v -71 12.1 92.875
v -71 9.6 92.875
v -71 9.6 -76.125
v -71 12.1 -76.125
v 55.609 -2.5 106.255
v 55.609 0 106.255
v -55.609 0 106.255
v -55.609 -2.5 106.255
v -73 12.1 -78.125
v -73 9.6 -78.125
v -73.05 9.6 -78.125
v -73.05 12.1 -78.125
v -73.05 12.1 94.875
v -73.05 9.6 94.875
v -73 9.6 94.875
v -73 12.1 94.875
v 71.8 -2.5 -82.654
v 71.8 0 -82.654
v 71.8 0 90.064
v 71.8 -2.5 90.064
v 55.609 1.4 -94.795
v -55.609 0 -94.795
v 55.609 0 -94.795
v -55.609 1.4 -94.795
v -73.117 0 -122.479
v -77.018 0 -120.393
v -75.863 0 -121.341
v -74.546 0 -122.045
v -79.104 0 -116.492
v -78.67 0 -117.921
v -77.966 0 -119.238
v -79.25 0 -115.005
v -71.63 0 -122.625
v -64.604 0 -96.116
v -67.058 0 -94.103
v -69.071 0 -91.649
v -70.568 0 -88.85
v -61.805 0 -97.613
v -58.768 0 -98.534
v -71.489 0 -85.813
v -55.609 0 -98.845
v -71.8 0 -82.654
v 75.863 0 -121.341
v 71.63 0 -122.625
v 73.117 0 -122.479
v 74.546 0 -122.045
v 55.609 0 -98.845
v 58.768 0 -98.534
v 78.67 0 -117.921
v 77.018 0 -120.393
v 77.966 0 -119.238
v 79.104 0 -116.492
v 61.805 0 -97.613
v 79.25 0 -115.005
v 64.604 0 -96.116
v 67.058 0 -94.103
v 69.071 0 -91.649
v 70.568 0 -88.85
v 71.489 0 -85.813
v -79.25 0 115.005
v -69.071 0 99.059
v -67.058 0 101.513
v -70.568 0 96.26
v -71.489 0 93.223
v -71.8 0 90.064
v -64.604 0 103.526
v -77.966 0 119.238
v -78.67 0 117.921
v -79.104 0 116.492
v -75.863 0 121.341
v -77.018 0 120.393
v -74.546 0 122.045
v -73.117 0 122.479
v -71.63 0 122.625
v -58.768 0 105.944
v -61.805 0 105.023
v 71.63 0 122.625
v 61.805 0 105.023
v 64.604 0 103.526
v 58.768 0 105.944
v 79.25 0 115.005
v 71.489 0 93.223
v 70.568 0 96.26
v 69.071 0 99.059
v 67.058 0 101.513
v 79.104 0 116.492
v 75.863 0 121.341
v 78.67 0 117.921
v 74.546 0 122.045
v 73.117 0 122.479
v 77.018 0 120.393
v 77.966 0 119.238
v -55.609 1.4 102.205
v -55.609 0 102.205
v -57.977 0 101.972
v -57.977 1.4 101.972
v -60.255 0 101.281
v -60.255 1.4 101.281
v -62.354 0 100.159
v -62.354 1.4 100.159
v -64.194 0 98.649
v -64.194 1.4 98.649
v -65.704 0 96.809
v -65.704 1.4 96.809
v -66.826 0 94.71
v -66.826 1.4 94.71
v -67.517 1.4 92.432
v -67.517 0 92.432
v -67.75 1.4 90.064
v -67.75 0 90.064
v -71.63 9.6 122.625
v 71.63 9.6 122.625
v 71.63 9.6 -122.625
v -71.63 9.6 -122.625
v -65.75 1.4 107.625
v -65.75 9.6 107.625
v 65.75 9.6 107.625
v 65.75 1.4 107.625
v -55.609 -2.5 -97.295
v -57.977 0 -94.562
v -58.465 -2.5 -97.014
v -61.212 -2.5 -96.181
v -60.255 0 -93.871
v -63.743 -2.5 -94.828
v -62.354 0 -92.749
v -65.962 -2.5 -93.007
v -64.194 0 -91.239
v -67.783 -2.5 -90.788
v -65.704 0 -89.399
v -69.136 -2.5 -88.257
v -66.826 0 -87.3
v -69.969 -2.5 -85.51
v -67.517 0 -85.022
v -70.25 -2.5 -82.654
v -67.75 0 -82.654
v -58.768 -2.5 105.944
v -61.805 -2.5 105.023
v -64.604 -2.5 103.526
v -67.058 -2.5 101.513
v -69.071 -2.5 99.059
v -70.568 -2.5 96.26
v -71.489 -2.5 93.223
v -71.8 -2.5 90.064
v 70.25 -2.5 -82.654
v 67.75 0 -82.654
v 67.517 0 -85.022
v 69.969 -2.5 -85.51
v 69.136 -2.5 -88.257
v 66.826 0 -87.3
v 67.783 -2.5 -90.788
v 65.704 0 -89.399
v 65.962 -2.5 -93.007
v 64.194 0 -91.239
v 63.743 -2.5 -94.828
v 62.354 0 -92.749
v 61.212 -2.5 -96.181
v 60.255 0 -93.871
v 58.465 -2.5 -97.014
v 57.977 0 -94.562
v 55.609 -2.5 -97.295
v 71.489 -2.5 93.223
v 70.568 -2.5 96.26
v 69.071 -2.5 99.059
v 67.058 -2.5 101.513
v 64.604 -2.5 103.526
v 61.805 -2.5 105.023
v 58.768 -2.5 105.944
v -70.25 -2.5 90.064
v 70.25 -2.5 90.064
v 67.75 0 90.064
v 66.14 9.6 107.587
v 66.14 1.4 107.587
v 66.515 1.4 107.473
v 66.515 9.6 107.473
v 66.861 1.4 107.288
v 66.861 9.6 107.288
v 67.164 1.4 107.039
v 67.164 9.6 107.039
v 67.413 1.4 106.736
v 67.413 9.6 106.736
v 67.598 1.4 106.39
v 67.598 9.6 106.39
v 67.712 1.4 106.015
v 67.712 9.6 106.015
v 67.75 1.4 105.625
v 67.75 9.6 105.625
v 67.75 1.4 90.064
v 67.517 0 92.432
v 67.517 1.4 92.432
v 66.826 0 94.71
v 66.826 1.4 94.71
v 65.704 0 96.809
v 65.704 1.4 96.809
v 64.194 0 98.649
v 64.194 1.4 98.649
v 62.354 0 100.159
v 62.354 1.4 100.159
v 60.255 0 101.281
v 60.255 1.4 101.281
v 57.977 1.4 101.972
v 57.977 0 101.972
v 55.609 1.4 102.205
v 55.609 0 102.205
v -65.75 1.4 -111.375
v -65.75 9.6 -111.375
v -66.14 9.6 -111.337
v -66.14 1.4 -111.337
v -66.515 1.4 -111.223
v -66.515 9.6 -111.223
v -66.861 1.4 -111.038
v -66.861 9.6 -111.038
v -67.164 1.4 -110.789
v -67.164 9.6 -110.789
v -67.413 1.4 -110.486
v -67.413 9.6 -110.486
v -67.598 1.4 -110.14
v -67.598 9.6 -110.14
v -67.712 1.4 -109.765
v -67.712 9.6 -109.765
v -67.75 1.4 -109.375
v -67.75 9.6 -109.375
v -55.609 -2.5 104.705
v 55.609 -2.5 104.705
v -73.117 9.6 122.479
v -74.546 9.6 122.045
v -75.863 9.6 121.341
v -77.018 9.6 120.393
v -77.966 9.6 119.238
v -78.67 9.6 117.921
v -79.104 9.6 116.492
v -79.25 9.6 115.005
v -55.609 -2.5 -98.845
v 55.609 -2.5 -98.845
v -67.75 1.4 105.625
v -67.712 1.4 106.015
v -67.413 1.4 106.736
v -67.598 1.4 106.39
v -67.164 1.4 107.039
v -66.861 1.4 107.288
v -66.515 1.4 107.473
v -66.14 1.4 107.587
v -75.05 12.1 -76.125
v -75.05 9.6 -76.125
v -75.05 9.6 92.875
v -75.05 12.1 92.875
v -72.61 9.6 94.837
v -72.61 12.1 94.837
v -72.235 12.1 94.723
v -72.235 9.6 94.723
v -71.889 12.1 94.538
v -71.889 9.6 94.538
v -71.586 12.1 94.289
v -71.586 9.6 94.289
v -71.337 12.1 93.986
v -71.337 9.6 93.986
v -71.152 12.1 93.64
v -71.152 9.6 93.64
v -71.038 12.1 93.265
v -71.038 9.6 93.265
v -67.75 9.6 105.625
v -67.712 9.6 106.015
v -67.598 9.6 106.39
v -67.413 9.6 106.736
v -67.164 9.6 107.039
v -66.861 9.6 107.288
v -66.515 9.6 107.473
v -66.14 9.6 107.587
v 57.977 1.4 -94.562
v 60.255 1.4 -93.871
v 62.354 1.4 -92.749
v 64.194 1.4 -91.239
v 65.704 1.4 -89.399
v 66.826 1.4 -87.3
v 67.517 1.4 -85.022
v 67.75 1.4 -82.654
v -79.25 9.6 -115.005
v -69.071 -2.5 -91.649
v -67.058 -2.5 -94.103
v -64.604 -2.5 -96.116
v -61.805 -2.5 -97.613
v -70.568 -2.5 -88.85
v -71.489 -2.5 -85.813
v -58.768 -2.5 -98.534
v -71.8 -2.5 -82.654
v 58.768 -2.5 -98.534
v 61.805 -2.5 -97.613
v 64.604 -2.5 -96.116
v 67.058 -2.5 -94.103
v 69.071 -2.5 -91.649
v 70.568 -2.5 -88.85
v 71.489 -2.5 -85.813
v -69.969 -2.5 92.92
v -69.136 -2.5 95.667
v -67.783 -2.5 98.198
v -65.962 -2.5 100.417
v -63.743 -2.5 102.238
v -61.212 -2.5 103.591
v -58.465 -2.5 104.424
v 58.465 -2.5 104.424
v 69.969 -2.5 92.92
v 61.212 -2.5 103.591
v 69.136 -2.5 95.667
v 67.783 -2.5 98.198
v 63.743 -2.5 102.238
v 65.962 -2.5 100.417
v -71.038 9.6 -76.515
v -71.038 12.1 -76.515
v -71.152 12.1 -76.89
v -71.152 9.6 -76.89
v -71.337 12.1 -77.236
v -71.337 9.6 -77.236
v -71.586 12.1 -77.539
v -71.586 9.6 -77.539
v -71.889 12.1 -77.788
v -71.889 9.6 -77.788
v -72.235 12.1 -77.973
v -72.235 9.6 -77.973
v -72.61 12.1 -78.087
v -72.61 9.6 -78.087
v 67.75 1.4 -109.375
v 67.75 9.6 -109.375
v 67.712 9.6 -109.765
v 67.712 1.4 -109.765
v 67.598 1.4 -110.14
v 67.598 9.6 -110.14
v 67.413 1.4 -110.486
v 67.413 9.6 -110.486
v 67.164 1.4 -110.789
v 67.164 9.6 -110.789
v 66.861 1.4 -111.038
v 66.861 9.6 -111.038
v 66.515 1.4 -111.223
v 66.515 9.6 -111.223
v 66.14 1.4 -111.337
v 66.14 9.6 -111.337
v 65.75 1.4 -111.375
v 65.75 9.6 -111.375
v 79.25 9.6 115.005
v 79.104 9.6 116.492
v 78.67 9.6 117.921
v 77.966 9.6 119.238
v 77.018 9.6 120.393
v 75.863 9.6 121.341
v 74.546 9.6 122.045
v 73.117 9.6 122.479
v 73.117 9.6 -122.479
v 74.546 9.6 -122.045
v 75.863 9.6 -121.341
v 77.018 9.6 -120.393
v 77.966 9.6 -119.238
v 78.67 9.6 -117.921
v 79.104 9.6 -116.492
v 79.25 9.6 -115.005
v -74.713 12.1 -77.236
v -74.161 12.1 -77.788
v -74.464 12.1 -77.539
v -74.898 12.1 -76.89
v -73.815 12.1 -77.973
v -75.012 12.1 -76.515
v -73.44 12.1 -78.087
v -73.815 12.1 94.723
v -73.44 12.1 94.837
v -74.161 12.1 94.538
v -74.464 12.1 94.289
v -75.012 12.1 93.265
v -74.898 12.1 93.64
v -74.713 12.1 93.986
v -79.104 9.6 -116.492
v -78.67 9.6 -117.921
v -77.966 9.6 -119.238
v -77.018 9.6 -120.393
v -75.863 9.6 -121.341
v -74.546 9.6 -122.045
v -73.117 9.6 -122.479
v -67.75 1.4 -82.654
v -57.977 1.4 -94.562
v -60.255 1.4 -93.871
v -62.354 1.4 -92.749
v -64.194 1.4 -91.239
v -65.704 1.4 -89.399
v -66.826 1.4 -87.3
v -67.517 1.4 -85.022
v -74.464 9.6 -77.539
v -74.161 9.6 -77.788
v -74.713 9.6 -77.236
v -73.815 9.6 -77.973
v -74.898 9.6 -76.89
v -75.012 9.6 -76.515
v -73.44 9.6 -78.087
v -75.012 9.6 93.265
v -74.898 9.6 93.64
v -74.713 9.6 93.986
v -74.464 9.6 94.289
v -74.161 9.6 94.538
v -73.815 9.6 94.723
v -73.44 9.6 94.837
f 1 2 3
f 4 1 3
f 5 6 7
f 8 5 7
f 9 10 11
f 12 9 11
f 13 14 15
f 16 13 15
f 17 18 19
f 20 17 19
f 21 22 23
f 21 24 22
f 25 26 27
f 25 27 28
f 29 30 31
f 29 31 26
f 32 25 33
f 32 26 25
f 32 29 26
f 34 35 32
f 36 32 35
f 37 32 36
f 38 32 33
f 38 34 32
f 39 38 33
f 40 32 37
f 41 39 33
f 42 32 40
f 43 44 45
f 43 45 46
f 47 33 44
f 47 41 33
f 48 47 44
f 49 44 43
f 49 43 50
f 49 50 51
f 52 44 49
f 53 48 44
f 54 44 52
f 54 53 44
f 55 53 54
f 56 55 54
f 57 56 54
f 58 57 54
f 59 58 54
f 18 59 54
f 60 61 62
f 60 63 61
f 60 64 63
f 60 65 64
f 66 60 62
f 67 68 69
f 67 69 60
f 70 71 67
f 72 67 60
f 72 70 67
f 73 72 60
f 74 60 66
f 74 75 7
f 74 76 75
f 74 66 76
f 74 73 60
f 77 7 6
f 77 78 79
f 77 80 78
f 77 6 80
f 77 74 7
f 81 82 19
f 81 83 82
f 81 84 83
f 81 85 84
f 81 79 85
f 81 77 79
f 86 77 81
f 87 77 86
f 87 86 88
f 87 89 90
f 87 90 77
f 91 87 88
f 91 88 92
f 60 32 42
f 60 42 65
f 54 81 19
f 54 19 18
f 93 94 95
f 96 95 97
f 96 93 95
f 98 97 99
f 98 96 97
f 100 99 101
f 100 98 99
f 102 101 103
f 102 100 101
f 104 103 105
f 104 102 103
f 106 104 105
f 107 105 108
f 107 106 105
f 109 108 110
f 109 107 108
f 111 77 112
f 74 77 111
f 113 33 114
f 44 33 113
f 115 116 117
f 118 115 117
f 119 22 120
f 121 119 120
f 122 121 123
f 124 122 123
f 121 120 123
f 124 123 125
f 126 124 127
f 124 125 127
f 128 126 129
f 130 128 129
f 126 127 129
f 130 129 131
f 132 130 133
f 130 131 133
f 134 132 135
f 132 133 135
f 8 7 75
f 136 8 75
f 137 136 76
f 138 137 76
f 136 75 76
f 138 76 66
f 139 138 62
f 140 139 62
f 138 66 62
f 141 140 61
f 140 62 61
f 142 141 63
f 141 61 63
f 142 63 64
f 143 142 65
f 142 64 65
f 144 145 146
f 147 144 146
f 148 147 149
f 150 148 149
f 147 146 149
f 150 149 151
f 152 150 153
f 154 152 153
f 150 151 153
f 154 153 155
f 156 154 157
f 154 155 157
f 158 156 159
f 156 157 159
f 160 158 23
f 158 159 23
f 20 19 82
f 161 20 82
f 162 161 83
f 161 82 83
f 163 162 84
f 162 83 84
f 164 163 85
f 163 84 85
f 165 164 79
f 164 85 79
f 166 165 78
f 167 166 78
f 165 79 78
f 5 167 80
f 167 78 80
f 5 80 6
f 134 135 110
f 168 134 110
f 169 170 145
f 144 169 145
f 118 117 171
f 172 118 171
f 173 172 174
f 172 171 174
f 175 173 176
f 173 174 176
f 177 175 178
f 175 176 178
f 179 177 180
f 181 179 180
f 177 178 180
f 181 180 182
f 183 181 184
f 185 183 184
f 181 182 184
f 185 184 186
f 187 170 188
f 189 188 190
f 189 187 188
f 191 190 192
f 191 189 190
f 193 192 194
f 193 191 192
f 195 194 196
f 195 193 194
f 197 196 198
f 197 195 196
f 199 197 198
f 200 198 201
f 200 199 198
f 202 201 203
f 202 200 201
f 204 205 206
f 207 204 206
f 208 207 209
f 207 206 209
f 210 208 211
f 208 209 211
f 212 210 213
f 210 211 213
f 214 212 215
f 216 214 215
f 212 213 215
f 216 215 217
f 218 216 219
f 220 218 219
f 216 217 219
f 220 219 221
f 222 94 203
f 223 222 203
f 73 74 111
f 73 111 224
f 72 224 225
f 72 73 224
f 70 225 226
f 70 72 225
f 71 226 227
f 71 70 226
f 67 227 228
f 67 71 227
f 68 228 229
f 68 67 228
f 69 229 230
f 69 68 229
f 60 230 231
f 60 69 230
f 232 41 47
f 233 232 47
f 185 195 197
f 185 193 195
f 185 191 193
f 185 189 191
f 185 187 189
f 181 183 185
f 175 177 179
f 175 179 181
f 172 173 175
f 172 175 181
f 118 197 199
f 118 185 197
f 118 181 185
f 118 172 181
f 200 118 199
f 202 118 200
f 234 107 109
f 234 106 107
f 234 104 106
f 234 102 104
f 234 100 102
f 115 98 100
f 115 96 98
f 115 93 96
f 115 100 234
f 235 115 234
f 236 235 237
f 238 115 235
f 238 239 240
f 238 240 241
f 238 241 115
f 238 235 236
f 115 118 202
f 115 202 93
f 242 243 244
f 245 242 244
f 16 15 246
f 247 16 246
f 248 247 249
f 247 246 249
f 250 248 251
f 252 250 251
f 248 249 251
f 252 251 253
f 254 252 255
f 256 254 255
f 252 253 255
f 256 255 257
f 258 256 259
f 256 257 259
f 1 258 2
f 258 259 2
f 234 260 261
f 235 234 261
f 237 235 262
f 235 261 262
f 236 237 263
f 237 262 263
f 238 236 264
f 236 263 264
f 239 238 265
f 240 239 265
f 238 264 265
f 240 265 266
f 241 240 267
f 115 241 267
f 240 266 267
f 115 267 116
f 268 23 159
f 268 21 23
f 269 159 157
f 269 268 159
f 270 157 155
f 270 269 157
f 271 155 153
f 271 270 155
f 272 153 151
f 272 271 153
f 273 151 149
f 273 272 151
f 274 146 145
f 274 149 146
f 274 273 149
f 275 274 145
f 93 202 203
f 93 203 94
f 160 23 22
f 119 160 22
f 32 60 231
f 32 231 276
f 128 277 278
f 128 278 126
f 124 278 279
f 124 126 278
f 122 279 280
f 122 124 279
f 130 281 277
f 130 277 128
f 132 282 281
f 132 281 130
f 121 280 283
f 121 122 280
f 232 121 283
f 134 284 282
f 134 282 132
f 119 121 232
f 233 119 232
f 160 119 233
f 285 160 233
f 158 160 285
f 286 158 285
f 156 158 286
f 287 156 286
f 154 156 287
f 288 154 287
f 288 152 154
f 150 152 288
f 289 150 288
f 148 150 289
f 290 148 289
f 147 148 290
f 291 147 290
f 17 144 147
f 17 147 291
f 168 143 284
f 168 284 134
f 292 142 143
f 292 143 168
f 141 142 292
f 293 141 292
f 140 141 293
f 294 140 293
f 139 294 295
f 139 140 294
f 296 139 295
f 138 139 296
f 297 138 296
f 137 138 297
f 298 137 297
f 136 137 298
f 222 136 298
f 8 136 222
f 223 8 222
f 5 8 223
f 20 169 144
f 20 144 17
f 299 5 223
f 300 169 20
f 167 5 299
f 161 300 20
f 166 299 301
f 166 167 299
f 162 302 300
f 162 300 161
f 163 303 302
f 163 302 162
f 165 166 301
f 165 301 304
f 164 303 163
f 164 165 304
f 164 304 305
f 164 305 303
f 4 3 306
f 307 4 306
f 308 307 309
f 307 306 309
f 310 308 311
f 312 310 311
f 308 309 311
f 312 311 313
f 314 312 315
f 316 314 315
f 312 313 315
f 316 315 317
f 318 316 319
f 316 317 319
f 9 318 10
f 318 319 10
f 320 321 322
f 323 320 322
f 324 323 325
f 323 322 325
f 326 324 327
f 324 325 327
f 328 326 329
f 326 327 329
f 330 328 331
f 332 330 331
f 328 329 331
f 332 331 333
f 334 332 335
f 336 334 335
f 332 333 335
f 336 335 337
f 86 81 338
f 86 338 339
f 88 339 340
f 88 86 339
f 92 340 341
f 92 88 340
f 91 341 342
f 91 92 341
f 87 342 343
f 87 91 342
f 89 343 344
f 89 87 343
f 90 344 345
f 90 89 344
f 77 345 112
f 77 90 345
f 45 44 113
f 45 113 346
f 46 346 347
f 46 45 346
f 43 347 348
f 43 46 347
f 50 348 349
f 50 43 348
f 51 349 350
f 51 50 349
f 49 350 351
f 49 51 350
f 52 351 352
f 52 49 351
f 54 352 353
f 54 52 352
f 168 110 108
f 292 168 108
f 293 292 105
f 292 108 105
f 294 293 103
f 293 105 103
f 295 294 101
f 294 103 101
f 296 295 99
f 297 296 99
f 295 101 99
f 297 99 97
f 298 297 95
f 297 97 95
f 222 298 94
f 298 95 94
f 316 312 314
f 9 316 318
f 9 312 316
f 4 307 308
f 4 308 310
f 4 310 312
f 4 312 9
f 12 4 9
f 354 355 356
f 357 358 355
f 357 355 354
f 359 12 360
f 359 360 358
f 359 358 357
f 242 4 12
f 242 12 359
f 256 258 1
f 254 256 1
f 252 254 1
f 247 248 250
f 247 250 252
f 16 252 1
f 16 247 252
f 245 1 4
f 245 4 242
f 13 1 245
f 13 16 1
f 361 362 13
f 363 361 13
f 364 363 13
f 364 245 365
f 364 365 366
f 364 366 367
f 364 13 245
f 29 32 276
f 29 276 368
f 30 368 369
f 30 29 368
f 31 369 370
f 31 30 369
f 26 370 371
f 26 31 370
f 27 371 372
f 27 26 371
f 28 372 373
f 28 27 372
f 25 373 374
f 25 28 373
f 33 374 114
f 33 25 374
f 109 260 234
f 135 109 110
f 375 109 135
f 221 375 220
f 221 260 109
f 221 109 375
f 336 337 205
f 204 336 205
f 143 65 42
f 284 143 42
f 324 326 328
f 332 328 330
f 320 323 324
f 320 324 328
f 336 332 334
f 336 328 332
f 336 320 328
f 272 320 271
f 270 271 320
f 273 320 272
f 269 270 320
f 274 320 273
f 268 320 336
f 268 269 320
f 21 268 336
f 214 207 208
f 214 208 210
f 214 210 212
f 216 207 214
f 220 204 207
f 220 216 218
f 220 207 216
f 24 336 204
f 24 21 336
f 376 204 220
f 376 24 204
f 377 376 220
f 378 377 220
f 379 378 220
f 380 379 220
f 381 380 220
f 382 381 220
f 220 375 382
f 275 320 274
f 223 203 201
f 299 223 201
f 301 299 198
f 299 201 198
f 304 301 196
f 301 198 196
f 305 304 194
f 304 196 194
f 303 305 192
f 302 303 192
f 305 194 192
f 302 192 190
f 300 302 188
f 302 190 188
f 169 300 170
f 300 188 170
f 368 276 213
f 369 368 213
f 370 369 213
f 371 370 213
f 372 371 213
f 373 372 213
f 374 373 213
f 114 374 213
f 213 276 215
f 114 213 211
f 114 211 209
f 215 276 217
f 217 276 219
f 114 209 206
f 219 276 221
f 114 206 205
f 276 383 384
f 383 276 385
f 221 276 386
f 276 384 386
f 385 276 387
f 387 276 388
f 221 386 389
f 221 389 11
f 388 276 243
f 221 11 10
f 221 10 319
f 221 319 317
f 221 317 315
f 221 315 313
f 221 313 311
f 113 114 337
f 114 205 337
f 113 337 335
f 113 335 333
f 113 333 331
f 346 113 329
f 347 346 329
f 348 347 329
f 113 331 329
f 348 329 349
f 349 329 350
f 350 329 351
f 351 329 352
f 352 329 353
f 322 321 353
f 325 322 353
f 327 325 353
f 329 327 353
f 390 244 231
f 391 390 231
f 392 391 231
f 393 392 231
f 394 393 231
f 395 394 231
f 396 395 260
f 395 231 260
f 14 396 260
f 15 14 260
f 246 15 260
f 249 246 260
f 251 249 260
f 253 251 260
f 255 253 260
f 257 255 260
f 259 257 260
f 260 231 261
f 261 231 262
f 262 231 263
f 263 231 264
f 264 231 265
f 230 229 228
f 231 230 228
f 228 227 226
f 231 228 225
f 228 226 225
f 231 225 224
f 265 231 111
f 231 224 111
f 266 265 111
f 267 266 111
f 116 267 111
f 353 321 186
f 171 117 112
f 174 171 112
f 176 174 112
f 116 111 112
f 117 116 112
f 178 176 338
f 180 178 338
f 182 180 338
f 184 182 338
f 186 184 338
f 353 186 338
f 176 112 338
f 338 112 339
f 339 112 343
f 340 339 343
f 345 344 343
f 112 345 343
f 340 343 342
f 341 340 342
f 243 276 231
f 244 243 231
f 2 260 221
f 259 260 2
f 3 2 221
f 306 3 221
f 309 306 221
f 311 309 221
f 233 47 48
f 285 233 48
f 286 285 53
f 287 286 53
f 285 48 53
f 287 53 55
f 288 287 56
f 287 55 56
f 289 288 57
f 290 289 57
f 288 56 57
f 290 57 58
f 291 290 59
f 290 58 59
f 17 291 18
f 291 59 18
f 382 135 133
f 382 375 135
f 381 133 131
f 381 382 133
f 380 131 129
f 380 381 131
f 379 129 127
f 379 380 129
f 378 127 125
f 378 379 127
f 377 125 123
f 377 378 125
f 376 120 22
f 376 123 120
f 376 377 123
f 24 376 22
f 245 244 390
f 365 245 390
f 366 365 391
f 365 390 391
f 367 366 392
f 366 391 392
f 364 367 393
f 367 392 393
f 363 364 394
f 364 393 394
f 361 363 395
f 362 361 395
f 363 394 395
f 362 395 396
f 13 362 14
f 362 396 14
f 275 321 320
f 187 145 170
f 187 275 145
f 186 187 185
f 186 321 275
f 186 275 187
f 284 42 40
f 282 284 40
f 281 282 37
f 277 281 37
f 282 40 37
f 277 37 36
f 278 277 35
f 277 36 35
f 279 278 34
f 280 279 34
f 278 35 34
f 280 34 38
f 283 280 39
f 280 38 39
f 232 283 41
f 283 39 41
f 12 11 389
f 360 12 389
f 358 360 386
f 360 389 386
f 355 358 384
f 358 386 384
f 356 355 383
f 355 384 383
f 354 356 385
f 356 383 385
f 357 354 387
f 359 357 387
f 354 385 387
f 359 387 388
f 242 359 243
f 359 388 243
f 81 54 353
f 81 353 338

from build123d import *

# Parameters (mm, degrees)
F1_DEPTH  = 9.6
F3_DEPTH  = 10
F5_DEPTH  = 2.5
F6_DEPTH  = 68.834
F7_SIZE   = 2.5
F9_DEPTH  = 8.2
F11_DEPTH = 2.5


with BuildPart() as f1:
    # F0 (on Front) → F1 (new body)
    with BuildSketch(Plane.XZ):
        with BuildLine():
            Line((71.63, 122.625), (-71.63, 122.625))
            ThreePointArc((-71.63, 122.625), (-77.018154, 120.393154), (-79.25, 115.005))
            Line((-79.25, 115.005), (-79.25, -115.005))
            ThreePointArc((-79.25, -115.005), (-77.018154, -120.393154), (-71.63, -122.625))
            Line((-71.63, -122.625), (71.63, -122.625))
            ThreePointArc((71.63, -122.625), (77.018154, -120.393154), (79.25, -115.005))
            Line((79.25, -115.005), (79.25, 115.005))
            ThreePointArc((79.25, 115.005), (77.018154, 120.393154), (71.63, 122.625))
        make_face()
    extrude(amount=-F1_DEPTH)

    # F2 (on face) → F3 (cut)
    with BuildSketch(Plane.XZ):
        with BuildLine():
            Line((55.6088, 102.205), (-55.6088, 102.205))
            ThreePointArc((-55.6088, 102.205), (-64.193925, 98.648925), (-67.75, 90.0638))
            Line((-67.75, 90.0638), (-67.75, -82.6538))
            ThreePointArc((-67.75, -82.6538), (-64.193925, -91.238925), (-55.6088, -94.795))
            Line((-55.6088, -94.795), (55.6088, -94.795))
            ThreePointArc((55.6088, -94.795), (64.193925, -91.238925), (67.75, -82.6538))
            Line((67.75, -82.6538), (67.75, 90.0638))
            ThreePointArc((67.75, 90.0638), (64.193925, 98.648925), (55.6088, 102.205))
        make_face()
    extrude(amount=-F3_DEPTH, mode=Mode.SUBTRACT)

    # F4 (on face) → F5 (join)
    with BuildSketch(Plane.XZ):
        with BuildLine():
            Line((55.6088, 106.255), (-55.6088, 106.255))
            ThreePointArc((-55.6088, 106.255), (-67.057707, 101.512707), (-71.8, 90.0638))
            Line((-71.8, 90.0638), (-71.8, -82.6538))
            ThreePointArc((-71.8, -82.6538), (-67.057707, -94.102707), (-55.6088, -98.845))
            Line((-55.6088, -98.845), (55.6088, -98.845))
            ThreePointArc((55.6088, -98.845), (67.057707, -94.102707), (71.8, -82.6538))
            Line((71.8, -82.6538), (71.8, 90.0638))
            ThreePointArc((71.8, 90.0638), (67.057707, 101.512707), (55.6088, 106.255))
        make_face()
    extrude(amount=F5_DEPTH)

    # F2 (on face) → F6 (cut)
    with BuildSketch(Plane.XZ):
        with BuildLine():
            Line((55.6088, 102.205), (-55.6088, 102.205))
            ThreePointArc((-55.6088, 102.205), (-64.193925, 98.648925), (-67.75, 90.0638))
            Line((-67.75, 90.0638), (-67.75, -82.6538))
            ThreePointArc((-67.75, -82.6538), (-64.193925, -91.238925), (-55.6088, -94.795))
            Line((-55.6088, -94.795), (55.6088, -94.795))
            ThreePointArc((55.6088, -94.795), (64.193925, -91.238925), (67.75, -82.6538))
            Line((67.75, -82.6538), (67.75, 90.0638))
            ThreePointArc((67.75, 90.0638), (64.193925, 98.648925), (55.6088, 102.205))
        make_face()
    extrude(amount=F6_DEPTH, mode=Mode.SUBTRACT)

    # F7
    f7_edges = [f1.edges().sort_by_distance(p)[0] for p in [
        (67.75, -2.5, 3.705),
    ]]
    chamfer(f7_edges, length=F7_SIZE)

    # F8 (on face) → F9 (cut)
    with BuildSketch(Plane(origin=(0, 9.6, 0), x_dir=(-1, 0, 0), z_dir=(0, 1, 0))):
        with BuildLine():
            Line((65.75, 107.625), (-65.75, 107.625))
            ThreePointArc((-65.75, 107.625), (-67.164214, 107.039214), (-67.75, 105.625))
            Line((-67.75, 105.625), (-67.75, -109.375))
            ThreePointArc((-67.75, -109.375), (-67.164214, -110.789214), (-65.75, -111.375))
            Line((-65.75, -111.375), (65.75, -111.375))
            ThreePointArc((65.75, -111.375), (67.164214, -110.789214), (67.75, -109.375))
            Line((67.75, -109.375), (67.75, 105.625))
            ThreePointArc((67.75, 105.625), (67.164214, 107.039214), (65.75, 107.625))
        make_face()
    extrude(amount=-F9_DEPTH, mode=Mode.SUBTRACT)

    # F10 (on face) → F11 (join)
    with BuildSketch(Plane(origin=(0, 9.6, 0), x_dir=(-1, 0, 0), z_dir=(0, 1, 0))):
        with BuildLine():
            Line((73.05, 94.875), (73, 94.875))
            ThreePointArc((73, 94.875), (71.585786, 94.289214), (71, 92.875))
            Line((71, 92.875), (71, -76.125))
            ThreePointArc((71, -76.125), (71.585786, -77.539214), (73, -78.125))
            Line((73, -78.125), (73.05, -78.125))
            ThreePointArc((73.05, -78.125), (74.464214, -77.539214), (75.05, -76.125))
            Line((75.05, -76.125), (75.05, 92.875))
            ThreePointArc((75.05, 92.875), (74.464214, 94.289214), (73.05, 94.875))
        make_face()
    extrude(amount=F11_DEPTH)


solid = f1.part
